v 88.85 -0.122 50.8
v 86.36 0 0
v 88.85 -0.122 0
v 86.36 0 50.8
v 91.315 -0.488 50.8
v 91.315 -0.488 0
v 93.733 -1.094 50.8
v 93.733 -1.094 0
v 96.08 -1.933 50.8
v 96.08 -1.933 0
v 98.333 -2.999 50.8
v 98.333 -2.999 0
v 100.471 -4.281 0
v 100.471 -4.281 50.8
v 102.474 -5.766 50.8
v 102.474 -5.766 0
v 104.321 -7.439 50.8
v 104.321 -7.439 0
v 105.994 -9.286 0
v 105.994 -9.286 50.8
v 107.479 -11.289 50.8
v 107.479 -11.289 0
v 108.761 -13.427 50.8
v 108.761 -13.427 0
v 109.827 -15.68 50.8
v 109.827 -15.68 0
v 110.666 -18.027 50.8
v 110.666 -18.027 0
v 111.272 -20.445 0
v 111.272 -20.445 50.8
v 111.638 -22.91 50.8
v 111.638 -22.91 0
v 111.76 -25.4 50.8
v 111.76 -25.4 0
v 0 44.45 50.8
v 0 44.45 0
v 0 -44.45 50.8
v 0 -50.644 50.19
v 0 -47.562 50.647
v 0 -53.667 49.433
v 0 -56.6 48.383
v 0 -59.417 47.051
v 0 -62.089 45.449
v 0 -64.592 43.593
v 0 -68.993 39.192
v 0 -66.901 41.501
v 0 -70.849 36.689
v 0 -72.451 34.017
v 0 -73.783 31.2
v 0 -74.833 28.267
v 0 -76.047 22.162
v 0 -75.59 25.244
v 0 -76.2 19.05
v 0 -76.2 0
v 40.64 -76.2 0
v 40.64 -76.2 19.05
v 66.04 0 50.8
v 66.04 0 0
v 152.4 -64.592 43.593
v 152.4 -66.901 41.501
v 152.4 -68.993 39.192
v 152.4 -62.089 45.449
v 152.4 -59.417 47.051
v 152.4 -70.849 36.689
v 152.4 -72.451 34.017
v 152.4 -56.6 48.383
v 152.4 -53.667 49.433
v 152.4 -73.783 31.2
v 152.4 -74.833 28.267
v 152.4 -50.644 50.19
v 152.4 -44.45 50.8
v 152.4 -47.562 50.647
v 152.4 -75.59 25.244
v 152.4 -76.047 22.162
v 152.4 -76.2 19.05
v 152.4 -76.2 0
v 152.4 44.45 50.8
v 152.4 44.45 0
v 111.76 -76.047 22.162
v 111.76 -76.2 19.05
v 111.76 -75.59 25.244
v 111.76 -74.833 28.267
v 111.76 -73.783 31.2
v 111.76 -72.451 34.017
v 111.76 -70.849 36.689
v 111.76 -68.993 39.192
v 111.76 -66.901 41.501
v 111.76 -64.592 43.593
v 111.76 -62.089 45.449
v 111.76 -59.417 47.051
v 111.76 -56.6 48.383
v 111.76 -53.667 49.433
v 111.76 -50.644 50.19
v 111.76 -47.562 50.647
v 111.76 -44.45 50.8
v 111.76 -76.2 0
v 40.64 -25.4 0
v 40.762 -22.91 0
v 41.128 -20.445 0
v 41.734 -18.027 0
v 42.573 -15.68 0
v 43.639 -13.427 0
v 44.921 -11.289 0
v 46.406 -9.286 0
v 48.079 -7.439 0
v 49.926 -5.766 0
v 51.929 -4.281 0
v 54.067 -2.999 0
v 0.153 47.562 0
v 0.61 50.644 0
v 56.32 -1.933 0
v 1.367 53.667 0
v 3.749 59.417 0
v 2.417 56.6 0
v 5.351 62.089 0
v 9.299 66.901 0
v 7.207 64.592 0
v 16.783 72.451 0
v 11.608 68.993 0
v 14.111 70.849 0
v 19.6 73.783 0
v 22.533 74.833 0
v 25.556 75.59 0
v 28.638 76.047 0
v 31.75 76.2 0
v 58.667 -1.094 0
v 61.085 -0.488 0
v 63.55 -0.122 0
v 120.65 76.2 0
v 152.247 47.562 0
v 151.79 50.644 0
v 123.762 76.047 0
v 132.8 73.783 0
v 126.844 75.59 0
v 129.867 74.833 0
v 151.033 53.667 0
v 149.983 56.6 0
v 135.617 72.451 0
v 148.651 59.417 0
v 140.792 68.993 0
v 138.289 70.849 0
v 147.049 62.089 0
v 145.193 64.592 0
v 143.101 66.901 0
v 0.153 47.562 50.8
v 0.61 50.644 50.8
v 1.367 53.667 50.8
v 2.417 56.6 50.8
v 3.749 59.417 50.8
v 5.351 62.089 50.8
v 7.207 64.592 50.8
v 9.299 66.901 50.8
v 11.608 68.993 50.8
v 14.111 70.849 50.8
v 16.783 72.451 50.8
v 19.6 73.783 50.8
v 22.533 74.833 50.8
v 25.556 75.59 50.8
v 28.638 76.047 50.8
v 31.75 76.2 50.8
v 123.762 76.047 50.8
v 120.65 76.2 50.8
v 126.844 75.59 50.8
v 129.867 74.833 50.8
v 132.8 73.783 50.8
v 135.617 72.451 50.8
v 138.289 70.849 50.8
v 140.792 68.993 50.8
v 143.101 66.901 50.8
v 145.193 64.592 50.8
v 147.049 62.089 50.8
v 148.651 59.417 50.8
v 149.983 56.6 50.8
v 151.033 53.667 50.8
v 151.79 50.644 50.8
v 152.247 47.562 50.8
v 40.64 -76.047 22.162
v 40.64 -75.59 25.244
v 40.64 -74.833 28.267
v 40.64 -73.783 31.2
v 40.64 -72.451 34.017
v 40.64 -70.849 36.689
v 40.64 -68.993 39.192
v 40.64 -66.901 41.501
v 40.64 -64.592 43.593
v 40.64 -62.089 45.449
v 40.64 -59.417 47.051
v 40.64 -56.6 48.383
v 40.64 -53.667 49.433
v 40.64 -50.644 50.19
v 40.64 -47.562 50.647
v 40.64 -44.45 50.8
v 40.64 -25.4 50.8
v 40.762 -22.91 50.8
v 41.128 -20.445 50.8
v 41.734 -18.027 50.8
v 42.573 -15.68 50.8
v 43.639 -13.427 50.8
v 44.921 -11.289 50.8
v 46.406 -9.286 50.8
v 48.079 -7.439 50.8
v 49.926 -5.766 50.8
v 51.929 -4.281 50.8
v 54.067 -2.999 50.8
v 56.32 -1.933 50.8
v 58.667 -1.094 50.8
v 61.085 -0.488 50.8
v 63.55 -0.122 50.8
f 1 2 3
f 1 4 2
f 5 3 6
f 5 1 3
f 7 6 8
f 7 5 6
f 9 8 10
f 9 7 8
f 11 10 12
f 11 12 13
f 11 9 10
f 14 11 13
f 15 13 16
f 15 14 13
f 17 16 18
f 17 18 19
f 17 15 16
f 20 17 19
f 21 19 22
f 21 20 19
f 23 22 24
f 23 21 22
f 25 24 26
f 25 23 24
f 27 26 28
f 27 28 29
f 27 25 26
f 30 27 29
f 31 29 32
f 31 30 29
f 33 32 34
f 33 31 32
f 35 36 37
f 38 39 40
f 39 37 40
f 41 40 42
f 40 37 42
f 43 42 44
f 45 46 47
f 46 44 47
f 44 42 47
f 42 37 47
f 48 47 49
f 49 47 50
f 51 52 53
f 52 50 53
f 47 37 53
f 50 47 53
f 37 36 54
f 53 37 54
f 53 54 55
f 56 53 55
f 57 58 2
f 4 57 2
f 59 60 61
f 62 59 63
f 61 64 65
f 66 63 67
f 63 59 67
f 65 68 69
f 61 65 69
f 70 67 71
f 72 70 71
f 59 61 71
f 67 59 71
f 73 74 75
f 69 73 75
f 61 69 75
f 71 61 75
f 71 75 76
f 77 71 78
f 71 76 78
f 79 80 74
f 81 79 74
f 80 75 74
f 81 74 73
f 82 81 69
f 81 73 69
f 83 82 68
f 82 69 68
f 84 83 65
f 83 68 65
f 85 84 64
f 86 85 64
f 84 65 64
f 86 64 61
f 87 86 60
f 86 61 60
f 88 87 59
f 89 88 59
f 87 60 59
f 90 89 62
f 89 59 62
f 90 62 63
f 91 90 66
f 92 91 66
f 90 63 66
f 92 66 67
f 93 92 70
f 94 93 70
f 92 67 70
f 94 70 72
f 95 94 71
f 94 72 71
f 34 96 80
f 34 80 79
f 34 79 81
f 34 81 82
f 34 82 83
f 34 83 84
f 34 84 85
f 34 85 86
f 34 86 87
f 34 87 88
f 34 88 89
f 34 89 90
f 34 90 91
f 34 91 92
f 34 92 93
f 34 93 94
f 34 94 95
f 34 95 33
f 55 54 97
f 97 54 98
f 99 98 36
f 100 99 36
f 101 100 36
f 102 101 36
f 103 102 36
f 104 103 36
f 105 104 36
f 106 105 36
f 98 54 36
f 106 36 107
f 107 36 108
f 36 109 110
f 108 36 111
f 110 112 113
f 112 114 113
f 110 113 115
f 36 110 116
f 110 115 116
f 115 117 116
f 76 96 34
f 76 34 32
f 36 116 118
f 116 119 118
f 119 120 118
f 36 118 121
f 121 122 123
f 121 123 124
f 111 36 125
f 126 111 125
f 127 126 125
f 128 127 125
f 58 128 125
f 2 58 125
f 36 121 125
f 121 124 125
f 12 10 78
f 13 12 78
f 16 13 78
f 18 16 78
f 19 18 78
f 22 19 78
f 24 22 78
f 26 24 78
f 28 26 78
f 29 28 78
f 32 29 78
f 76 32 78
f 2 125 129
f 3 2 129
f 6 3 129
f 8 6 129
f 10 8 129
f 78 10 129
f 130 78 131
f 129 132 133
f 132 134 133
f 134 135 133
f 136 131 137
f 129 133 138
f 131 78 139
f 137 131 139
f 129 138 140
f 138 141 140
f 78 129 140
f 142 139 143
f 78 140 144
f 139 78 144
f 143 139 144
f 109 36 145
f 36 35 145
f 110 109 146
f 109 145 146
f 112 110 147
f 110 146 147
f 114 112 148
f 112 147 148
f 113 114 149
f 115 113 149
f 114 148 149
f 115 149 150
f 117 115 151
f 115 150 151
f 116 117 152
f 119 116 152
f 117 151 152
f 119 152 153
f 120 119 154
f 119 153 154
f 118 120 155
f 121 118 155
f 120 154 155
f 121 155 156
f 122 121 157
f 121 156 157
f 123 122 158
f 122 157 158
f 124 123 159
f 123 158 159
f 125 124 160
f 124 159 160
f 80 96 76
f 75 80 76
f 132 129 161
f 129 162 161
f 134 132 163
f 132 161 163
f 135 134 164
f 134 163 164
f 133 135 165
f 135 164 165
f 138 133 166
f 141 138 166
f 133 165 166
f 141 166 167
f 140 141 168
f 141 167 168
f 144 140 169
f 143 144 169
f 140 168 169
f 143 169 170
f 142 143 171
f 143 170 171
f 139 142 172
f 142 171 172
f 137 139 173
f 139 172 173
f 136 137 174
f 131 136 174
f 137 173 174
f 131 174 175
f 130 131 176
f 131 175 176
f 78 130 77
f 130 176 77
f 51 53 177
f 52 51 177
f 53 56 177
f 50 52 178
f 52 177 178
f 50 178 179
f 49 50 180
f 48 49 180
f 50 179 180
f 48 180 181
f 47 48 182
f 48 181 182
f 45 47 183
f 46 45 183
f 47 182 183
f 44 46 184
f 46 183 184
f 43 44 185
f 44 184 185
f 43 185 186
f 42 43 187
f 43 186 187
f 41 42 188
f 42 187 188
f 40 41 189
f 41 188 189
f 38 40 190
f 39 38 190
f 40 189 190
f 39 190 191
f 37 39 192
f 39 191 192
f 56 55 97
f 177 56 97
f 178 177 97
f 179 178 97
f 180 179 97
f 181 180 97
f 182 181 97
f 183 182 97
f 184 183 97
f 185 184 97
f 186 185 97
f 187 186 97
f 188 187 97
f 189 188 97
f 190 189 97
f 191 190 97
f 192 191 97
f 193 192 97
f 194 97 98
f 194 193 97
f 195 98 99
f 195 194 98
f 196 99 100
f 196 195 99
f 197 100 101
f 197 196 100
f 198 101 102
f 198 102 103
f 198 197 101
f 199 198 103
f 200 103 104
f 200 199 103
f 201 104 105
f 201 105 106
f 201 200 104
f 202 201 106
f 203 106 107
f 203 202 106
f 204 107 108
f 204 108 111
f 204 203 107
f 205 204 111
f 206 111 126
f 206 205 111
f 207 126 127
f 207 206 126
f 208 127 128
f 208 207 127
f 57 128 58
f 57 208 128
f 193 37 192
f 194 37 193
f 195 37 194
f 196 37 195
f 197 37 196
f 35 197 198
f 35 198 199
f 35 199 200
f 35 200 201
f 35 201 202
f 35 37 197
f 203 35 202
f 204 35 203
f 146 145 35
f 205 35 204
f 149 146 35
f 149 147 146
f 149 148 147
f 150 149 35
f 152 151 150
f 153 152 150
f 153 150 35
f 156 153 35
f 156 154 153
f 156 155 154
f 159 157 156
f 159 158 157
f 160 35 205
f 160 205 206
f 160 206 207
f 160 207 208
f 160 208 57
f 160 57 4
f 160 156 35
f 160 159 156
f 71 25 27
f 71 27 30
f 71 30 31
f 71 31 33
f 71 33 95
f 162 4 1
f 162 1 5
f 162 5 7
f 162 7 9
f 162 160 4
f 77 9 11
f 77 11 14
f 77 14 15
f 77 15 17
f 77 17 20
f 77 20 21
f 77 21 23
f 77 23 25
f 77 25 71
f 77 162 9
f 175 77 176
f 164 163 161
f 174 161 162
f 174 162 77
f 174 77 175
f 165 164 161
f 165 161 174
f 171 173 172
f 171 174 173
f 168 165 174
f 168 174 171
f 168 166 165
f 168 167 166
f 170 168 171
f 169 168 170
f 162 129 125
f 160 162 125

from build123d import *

# Parameters (mm, degrees)
F0_W     = 40.64
F0_H     = 76.2
F1_DEPTH = 50.8
F2_R     = 31.75
F3_R     = 31.75
F4_R     = 25.4


with BuildPart() as f1:
    # F0 (on Top) → F1 (new body)
    with BuildSketch(Plane.XY):
        Polygon((0, 76.2), (0, 0), (40.64, 0), (111.76, 0), (152.4, 0), (152.4, 76.2), align=None)
        with Locations((20.32, -38.1)):
            Rectangle(F0_W, F0_H)
        with Locations((132.08, -38.1)):
            Rectangle(F0_W, F0_H)
    extrude(amount=F1_DEPTH)

    # F2
    f2_edges = [f1.edges().sort_by_distance(p)[0] for p in [
        (20.32, -76.2, 50.8),
        (132.08, -76.2, 50.8),
    ]]
    fillet(f2_edges, radius=F2_R)

    # F3
    f3_edges = [f1.edges().sort_by_distance(p)[0] for p in [
        (152.4, 76.2, 25.4),
        (0, 76.2, 25.4),
    ]]
    fillet(f3_edges, radius=F3_R)

    # F4
    f4_edges = [f1.edges().sort_by_distance(p)[0] for p in [
        (111.76, 0, 25.4),
        (40.64, 0, 25.4),
    ]]
    fillet(f4_edges, radius=F4_R)


solid = f1.part
